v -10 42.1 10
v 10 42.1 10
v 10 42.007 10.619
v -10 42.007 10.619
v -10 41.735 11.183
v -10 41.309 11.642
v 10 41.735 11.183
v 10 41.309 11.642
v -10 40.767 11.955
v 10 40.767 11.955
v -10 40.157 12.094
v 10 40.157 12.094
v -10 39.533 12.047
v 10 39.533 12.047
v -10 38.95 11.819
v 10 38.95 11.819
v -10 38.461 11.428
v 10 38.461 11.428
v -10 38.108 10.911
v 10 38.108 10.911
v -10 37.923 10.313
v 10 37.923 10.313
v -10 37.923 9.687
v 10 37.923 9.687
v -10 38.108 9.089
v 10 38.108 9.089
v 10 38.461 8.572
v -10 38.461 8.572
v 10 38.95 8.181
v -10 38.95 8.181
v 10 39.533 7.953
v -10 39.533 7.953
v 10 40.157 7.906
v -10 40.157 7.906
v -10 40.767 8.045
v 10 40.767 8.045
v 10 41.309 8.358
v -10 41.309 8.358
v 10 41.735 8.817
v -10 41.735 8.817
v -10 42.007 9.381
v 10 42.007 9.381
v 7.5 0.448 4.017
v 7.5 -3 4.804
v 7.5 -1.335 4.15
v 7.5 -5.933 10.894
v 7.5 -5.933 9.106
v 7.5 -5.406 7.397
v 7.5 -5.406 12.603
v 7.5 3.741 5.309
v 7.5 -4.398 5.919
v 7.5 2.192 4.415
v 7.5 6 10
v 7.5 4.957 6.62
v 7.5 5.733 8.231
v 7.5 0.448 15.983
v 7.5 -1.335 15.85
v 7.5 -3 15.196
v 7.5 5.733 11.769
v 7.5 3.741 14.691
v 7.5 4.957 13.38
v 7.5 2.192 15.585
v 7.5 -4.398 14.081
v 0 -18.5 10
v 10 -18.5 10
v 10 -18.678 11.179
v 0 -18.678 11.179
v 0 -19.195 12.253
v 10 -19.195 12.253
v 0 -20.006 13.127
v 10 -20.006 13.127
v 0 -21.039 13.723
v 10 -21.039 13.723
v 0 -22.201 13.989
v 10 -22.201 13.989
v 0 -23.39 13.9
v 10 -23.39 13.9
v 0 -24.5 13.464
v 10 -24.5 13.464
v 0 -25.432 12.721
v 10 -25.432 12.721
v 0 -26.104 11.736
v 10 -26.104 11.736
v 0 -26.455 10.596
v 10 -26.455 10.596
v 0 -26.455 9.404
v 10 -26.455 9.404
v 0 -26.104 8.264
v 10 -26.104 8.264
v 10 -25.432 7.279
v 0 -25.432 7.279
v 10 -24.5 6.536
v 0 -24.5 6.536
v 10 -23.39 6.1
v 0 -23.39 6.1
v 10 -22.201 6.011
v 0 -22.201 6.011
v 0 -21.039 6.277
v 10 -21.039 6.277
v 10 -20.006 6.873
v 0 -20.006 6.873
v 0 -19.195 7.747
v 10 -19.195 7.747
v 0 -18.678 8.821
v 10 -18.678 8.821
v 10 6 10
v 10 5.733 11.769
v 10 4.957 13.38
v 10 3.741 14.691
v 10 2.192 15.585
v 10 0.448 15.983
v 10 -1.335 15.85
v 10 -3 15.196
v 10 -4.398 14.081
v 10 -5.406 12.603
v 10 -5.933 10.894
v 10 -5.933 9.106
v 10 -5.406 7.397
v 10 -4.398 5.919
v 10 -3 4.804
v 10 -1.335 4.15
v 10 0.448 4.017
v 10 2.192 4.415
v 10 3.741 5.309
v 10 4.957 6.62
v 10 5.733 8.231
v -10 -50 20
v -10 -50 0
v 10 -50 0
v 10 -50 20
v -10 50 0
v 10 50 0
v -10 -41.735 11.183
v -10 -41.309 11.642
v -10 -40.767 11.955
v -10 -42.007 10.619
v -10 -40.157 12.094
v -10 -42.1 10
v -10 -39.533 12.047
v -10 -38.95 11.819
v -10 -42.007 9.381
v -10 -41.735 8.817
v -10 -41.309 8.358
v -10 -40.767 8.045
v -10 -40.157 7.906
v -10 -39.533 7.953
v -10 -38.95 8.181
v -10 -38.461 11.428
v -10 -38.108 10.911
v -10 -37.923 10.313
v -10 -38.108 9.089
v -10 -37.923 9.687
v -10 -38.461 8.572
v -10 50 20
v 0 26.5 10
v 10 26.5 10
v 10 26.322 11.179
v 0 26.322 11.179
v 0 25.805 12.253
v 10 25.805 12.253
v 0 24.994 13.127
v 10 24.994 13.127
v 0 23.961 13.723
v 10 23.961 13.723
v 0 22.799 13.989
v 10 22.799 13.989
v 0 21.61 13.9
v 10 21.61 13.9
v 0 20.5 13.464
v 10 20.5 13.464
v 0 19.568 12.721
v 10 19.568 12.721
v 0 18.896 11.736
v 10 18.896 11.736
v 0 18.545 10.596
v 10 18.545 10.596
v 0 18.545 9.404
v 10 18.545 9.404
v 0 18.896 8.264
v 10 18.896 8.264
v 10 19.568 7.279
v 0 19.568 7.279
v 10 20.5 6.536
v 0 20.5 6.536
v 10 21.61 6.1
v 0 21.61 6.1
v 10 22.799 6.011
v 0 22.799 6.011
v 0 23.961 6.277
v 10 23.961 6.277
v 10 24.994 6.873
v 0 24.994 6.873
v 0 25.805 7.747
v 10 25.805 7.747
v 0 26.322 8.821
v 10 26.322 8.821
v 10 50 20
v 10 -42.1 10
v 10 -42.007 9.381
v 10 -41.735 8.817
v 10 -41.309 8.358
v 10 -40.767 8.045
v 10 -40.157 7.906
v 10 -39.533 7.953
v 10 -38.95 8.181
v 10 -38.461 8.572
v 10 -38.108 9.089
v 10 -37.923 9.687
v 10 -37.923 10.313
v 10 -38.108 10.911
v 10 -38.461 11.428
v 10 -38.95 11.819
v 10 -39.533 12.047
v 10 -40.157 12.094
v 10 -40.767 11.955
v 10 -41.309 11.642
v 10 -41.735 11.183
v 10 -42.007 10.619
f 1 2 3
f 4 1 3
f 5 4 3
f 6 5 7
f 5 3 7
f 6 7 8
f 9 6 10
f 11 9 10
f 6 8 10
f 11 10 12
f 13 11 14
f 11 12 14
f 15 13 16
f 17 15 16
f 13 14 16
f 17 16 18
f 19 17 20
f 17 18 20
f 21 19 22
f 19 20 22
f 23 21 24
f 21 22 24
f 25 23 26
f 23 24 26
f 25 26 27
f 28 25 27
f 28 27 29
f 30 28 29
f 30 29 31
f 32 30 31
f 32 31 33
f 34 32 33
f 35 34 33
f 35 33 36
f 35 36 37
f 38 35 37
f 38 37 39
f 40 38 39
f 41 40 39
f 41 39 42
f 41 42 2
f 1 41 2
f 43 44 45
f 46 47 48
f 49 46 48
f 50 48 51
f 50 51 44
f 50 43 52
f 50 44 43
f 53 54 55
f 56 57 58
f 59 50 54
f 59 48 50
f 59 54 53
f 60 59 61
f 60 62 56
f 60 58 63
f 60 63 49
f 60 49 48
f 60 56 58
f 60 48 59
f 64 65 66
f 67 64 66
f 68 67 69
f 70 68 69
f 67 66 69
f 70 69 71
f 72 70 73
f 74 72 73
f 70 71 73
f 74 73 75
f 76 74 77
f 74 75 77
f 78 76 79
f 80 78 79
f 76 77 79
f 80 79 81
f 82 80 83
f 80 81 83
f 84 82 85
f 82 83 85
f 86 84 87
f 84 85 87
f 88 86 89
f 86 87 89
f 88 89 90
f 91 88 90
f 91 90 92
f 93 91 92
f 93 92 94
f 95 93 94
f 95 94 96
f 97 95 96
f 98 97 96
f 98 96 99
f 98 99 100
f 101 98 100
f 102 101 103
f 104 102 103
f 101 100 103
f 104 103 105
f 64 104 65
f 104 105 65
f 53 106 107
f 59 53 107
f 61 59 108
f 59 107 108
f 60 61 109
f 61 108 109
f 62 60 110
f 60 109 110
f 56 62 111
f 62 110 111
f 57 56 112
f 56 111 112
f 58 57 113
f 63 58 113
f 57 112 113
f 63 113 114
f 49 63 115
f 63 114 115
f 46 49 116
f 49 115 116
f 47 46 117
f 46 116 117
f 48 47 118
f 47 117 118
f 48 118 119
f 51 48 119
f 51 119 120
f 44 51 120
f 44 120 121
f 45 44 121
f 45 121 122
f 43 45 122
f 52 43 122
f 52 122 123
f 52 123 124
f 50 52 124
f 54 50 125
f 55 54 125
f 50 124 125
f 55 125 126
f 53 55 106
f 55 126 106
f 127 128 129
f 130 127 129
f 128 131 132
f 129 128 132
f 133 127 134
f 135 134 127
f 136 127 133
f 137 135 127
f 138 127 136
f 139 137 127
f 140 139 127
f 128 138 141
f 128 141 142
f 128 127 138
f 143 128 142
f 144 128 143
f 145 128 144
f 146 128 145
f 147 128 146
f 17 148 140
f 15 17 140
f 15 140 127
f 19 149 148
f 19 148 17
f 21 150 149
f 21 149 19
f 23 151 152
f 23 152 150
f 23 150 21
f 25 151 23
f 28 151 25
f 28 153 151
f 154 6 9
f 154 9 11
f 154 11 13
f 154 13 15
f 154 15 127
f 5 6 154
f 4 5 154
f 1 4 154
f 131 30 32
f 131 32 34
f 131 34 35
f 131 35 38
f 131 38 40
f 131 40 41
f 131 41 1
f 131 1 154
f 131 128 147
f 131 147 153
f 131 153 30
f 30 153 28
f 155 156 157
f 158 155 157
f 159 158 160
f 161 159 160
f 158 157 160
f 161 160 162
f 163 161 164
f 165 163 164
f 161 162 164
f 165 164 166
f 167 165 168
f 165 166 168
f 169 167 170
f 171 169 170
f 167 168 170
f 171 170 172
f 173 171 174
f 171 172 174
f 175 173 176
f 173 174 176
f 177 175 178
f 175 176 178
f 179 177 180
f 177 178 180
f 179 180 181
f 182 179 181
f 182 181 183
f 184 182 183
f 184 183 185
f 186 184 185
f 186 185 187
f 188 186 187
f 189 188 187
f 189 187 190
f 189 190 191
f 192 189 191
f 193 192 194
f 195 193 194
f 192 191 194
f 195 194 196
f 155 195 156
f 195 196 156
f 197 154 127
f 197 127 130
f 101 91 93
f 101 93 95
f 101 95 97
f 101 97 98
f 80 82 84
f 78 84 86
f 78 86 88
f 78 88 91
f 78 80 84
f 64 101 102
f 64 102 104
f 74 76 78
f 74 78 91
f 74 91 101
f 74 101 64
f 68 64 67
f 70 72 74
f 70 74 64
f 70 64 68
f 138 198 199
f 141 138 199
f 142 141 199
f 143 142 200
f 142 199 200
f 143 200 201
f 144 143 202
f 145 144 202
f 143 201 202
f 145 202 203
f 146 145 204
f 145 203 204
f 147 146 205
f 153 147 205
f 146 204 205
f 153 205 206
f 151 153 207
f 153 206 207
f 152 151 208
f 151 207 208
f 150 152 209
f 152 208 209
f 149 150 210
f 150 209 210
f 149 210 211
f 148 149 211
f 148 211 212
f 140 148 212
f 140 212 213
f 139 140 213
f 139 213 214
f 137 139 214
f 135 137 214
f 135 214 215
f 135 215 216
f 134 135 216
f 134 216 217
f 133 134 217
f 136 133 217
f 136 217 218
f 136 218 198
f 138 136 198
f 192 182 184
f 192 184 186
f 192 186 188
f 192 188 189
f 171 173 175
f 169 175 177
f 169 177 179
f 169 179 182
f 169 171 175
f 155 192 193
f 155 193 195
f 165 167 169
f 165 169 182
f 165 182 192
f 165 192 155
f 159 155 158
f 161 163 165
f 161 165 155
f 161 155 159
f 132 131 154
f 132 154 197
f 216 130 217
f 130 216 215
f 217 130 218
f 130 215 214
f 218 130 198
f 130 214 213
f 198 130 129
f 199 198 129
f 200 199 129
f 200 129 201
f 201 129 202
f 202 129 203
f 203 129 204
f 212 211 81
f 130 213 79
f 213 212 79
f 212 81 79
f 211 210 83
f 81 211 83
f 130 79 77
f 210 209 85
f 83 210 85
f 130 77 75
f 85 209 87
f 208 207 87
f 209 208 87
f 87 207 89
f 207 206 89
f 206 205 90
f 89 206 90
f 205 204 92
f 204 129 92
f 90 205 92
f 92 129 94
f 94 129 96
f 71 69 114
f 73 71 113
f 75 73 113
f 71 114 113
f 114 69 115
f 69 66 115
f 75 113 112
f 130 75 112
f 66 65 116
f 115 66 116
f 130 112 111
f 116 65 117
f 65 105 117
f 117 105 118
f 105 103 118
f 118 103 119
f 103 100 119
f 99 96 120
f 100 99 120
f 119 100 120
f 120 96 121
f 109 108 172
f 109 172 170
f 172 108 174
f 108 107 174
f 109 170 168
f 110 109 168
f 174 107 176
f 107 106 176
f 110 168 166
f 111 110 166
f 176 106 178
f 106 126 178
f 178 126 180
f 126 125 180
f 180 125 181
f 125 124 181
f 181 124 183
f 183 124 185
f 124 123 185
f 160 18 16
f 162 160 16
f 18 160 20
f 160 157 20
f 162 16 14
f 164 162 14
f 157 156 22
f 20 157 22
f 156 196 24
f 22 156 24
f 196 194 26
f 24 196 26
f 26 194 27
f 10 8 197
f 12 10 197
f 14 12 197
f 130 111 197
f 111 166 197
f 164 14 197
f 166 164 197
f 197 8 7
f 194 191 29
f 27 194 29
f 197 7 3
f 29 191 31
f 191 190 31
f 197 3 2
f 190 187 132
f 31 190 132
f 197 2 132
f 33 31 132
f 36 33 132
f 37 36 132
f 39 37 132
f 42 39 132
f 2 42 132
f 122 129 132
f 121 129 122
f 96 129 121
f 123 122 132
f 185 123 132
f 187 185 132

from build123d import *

# Parameters (mm, degrees)
F0_W     = 20
F0_H     = 100
F1_DEPTH = 20
F2_R     = 6
F3_DEPTH = 2.5
F4_R     = 4
F5_DEPTH = 10
F7_DEPTH = 25


with BuildPart() as f1:
    # F0 (on Top) → F1 (new body)
    with BuildSketch(Plane.XY):
        Rectangle(F0_W, F0_H)
    extrude(amount=F1_DEPTH)

    # F2 (on face) → F3 (cut)
    with BuildSketch(Plane.YZ.offset(10)):
        with Locations((0, 10)):
            Circle(F2_R)
    extrude(amount=-F3_DEPTH, mode=Mode.SUBTRACT)

    # F4 (on face) → F5 (cut)
    with BuildSketch(Plane.YZ.offset(10)):
        with Locations((22.5, 10)):
            Circle(F4_R)
        with Locations((-22.5, 10)):
            Circle(F4_R)
    extrude(amount=-F5_DEPTH, mode=Mode.SUBTRACT)

    # F6 (on face) → F7 (cut)
    with BuildSketch(Plane.YZ.offset(10)):
        with BuildLine():
            ThreePointArc((-37.9, 10), (-40, 12.1), (-42.1, 10))
            Line((-42.1, 10), (-37.9, 10))
        make_face()
        with BuildLine():
            Line((-37.9, 10), (-42.1, 10))
            ThreePointArc((-42.1, 10), (-40, 7.9), (-37.9, 10))
        make_face()
        with BuildLine():
            ThreePointArc((37.9, 10), (40, 7.9), (42.1, 10))
            Line((42.1, 10), (37.9, 10))
        make_face()
        with BuildLine():
            Line((37.9, 10), (42.1, 10))
            ThreePointArc((42.1, 10), (40, 12.1), (37.9, 10))
        make_face()
    extrude(amount=-F7_DEPTH, mode=Mode.SUBTRACT)


solid = f1.part
